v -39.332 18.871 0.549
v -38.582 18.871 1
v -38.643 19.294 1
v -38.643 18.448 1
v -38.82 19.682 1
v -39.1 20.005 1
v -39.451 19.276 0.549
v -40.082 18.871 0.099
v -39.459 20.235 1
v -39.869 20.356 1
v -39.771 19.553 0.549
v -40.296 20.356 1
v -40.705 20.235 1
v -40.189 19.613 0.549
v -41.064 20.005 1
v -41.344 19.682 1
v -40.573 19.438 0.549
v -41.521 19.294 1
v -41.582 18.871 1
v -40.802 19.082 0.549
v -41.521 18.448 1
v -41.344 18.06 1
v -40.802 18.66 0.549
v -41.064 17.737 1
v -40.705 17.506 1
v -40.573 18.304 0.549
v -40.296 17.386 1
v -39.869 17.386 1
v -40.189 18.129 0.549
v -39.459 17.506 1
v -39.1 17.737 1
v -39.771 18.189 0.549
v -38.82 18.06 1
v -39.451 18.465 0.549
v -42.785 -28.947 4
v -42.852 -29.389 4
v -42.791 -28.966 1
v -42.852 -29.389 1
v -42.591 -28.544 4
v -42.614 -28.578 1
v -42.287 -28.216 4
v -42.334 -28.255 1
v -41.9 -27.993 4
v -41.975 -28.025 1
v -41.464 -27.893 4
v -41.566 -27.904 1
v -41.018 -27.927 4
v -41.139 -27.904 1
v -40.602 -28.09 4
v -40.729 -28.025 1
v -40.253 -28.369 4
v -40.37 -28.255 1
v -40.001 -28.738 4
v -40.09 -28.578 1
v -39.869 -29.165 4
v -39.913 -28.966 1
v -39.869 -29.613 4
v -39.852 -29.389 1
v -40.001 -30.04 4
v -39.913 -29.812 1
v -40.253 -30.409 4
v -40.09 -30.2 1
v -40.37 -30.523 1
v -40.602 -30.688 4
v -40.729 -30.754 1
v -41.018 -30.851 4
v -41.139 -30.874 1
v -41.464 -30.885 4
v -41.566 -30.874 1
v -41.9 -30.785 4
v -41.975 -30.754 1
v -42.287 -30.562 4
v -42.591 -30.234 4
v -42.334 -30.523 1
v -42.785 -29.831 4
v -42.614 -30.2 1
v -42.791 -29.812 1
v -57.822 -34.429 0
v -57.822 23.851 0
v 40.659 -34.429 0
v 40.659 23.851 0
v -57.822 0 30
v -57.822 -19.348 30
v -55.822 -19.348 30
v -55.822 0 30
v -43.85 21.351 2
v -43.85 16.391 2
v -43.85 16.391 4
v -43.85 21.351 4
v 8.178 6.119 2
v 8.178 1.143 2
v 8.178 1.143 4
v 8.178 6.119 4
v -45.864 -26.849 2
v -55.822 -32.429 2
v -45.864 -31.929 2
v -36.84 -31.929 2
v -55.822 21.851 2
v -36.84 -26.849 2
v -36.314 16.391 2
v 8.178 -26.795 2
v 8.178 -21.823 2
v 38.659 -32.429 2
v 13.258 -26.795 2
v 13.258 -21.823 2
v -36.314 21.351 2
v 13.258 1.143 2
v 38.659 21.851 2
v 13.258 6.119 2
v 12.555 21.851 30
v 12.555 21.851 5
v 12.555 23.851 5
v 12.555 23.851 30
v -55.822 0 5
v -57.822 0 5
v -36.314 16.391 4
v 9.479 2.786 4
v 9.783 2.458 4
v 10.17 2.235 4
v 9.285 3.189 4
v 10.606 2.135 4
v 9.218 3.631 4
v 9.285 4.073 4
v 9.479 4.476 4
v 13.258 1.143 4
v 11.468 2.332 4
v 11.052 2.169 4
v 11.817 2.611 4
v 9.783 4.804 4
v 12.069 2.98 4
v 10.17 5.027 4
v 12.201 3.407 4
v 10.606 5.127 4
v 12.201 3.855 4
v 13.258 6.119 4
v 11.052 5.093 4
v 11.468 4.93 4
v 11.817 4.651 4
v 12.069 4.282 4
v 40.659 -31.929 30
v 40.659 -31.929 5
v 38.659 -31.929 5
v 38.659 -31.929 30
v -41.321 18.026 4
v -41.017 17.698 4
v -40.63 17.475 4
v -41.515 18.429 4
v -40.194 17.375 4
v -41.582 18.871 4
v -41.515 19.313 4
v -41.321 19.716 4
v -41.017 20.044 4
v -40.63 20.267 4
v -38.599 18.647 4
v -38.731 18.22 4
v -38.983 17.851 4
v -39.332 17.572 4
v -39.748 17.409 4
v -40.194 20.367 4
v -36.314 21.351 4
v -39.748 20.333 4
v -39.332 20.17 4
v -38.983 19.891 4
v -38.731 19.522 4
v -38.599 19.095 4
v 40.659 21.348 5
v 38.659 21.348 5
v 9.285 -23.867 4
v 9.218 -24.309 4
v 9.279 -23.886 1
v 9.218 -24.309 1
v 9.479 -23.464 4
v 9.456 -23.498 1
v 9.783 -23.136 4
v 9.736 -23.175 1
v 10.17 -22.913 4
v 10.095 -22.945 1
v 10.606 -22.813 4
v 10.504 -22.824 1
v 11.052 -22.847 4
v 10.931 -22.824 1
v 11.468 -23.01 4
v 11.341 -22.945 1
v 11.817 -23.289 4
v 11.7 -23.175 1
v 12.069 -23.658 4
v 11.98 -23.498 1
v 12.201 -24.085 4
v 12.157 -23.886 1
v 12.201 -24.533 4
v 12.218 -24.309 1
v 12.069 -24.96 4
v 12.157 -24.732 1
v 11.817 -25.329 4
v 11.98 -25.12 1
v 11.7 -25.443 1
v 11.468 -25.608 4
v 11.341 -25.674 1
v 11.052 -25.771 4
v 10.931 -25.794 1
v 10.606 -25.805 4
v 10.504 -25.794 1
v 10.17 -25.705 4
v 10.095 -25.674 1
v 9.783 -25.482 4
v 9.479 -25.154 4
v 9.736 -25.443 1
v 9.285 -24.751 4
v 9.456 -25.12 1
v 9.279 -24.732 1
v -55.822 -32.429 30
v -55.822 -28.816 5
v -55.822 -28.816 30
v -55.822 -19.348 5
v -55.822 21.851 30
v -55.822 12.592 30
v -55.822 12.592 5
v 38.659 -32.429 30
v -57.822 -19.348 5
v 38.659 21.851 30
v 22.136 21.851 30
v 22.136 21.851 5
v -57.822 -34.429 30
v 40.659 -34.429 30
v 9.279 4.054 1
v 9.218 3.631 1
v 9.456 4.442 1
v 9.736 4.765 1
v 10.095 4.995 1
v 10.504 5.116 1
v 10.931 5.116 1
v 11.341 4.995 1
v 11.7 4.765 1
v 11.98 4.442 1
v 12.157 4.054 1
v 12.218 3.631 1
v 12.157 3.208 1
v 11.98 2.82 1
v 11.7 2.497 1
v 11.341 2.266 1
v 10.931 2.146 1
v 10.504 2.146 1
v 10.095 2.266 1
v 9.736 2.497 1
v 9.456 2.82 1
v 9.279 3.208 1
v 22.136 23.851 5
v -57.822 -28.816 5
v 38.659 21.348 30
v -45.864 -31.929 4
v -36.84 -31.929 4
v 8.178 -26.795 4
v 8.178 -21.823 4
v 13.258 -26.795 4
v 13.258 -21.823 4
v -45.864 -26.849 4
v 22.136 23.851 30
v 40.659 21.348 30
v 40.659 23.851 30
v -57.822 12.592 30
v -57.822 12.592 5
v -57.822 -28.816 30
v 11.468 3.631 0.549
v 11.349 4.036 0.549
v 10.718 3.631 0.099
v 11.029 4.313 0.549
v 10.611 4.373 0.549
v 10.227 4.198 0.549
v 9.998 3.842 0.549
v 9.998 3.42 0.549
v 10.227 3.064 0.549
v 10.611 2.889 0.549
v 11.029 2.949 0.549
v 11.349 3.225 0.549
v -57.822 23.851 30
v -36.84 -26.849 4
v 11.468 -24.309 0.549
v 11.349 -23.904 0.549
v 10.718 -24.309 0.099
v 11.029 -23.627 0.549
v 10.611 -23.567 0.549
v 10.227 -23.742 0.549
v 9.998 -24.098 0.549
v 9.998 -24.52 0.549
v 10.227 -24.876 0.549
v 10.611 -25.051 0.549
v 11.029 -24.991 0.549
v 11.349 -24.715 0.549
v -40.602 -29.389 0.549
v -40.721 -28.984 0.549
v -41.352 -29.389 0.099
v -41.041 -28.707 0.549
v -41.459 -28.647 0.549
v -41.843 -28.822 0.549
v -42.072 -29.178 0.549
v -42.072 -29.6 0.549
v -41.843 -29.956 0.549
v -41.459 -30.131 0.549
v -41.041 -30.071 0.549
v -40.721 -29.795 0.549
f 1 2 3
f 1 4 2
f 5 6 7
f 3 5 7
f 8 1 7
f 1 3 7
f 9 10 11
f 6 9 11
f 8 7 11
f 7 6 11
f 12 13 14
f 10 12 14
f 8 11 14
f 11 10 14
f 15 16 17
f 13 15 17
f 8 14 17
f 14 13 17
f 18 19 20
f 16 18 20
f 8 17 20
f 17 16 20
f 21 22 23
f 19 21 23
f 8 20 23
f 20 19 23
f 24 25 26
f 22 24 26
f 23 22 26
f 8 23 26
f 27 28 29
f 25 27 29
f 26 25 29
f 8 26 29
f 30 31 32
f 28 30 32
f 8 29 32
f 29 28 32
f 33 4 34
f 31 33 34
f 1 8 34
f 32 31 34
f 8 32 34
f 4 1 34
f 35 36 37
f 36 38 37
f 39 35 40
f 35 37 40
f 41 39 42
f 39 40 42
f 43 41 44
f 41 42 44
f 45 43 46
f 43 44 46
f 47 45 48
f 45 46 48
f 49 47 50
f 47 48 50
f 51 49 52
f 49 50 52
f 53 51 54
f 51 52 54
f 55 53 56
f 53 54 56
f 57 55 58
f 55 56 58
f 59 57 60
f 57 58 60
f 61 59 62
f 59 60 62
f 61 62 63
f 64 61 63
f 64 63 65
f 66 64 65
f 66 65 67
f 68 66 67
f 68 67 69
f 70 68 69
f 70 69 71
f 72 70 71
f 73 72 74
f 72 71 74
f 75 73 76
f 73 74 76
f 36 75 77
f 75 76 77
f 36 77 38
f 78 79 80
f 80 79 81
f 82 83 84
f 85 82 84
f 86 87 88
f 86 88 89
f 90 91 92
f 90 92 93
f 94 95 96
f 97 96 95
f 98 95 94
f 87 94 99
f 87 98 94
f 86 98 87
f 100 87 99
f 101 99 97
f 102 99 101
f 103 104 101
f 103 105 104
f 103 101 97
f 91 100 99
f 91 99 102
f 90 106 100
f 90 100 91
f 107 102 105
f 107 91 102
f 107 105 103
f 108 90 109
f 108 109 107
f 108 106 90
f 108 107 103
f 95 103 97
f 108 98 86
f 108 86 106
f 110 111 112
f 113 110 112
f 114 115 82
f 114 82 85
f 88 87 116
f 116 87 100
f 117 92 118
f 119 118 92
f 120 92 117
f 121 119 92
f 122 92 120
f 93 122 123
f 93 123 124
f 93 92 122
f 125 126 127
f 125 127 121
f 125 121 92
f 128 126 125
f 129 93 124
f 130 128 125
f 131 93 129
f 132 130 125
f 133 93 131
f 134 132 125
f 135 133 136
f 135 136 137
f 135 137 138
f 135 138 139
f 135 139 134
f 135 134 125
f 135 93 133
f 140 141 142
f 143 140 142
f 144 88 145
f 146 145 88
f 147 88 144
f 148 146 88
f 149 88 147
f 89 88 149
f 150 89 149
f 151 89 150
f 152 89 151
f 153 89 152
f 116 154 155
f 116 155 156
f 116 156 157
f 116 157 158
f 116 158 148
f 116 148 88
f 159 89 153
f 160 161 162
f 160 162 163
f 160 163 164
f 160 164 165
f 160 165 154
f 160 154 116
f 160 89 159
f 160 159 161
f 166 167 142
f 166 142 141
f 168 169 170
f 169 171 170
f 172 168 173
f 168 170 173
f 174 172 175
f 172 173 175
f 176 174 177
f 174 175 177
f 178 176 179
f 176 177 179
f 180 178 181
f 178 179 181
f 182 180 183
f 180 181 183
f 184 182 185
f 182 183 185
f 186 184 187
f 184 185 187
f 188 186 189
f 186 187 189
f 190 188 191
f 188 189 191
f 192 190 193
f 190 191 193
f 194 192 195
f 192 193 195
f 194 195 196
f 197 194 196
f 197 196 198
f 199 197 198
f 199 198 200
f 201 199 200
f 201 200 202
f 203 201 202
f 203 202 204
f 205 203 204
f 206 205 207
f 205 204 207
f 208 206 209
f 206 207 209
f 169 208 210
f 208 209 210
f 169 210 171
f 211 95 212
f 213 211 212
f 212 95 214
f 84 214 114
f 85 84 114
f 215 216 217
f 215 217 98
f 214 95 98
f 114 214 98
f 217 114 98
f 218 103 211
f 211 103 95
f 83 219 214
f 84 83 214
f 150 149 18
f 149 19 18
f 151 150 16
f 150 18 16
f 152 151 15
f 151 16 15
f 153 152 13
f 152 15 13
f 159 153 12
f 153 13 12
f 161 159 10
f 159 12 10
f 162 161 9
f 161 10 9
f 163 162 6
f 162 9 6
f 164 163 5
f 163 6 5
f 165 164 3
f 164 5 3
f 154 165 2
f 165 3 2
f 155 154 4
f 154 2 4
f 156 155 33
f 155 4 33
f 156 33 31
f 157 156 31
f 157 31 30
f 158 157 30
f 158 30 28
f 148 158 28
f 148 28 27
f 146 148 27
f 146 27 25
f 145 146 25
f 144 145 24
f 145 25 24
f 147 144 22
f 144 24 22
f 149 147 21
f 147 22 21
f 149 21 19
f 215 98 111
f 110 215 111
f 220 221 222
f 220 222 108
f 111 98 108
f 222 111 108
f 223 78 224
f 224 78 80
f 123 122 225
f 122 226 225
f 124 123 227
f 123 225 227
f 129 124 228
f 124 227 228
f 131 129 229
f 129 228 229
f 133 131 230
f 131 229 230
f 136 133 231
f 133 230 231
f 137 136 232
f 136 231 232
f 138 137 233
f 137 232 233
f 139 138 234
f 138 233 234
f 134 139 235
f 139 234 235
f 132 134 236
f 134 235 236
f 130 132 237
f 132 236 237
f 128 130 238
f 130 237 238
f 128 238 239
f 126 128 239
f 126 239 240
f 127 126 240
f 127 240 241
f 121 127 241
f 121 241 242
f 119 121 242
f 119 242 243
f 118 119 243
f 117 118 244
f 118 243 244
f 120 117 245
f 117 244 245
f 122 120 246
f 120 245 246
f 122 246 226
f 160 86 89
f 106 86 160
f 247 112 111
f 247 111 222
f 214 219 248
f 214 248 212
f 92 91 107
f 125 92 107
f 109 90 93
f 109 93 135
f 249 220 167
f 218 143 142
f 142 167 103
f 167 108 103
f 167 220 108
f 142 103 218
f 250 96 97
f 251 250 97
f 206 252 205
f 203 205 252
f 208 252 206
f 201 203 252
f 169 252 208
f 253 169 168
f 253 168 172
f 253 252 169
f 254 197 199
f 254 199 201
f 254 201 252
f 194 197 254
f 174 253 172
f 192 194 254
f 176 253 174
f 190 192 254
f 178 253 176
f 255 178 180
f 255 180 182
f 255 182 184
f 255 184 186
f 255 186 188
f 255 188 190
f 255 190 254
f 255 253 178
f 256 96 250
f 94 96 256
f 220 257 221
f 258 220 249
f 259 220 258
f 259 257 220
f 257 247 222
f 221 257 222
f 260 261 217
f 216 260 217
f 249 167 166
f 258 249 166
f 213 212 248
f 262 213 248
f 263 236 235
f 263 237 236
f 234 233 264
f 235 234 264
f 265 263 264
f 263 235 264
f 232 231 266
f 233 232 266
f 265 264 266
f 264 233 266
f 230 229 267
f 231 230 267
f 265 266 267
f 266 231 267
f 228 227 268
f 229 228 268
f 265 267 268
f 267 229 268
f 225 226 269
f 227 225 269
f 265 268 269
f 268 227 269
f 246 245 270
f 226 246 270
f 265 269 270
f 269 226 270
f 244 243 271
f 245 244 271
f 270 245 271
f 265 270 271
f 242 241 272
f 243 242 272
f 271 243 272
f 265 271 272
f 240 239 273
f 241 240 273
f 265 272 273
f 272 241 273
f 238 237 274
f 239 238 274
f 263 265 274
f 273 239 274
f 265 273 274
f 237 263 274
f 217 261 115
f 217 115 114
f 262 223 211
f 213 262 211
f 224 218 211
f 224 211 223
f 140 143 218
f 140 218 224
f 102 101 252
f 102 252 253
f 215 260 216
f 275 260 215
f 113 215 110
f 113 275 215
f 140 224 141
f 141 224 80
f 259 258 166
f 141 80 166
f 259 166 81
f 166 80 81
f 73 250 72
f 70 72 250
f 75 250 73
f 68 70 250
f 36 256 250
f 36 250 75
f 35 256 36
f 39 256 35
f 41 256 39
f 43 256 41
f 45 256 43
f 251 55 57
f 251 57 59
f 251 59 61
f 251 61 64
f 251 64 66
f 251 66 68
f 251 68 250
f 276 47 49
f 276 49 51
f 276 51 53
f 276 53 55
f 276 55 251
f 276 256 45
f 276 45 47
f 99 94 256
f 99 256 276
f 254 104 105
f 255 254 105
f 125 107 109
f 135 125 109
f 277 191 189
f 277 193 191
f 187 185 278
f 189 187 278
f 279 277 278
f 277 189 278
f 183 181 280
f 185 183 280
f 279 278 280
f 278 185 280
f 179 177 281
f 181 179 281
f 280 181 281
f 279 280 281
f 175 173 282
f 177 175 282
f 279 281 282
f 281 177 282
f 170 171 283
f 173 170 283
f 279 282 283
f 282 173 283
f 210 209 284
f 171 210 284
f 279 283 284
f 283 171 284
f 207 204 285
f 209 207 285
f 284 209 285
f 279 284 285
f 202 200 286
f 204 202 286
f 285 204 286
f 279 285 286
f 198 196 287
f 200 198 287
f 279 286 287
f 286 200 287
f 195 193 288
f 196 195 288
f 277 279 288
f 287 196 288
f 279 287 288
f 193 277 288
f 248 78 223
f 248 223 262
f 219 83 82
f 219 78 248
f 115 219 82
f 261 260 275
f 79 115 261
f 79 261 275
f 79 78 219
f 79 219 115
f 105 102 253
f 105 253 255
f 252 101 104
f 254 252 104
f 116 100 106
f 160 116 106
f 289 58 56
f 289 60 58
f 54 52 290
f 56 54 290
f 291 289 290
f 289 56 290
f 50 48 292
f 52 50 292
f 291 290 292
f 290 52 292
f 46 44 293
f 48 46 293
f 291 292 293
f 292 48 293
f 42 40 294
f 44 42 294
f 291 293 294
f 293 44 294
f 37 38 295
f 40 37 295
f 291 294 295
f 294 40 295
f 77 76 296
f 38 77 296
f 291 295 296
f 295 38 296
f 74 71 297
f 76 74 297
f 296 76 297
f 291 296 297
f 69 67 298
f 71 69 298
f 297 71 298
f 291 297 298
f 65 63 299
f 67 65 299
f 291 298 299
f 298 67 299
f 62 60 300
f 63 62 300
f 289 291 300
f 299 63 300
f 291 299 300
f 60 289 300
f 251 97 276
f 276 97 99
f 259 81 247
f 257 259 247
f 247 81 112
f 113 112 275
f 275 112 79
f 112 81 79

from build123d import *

# Parameters (mm, degrees)
F0_W     = 9.0247368789
F0_H     = 5.08
F0_W_2   = 5.08
F0_H_2   = 4.9726772237
F0_W_3   = 7.5355667663
F0_H_3   = 4.96
F0_H_4   = 4.9763912218
F1_DEPTH = 2
F2_DEPTH = 4
F4_D     = 3
F4_DEPTH = 3
F4_TIP   = 0.9012909285
F0_W_4   = 2
F0_H_5   = 19.347961992
F5_DEPTH = 30
F0_H_6   = 9.4683412462
F0_H_7   = 12.5924479216
F0_W_5   = 9.5816506073
F0_H_8   = 2
F0_H_9   = 53.2766682494
F6_DEPTH = 5


with BuildPart() as f1:
    # F0 (on Top) → F1 (new body)
    with BuildSketch(Plane.XY):
        Polygon((12.5546930358, 21.8509457558), (-55.8220994771, 21.8509457558), (-55.8220994771, 12.5924479216), (-55.8220994771, 0), (-55.8220994771, -19.347961992), (-55.8220994771, -28.8163032383), (-55.8220994771, -32.4290542442), (38.6587072041, -32.4290542442), (38.6587072041, -31.9290542442), (38.6587072041, 21.3476140052), (38.6587072041, 21.8509457558), (22.1363436431, 21.8509457558), align=None)
        with Locations((-41.3520994771, -29.3890542442)):
            Rectangle(F0_W, F0_H, mode=Mode.SUBTRACT)
        with Locations((10.7179005229, -24.3090542442)):
            Rectangle(F0_W_2, F0_H_2, mode=Mode.SUBTRACT)
        with Locations((-40.0820994771, 18.8709457558)):
            Rectangle(F0_W_3, F0_H_3, mode=Mode.SUBTRACT)
        with Locations((10.7179005229, 3.6309457558)):
            Rectangle(F0_W_2, F0_H_4, mode=Mode.SUBTRACT)
    extrude(amount=F1_DEPTH)

    # F0 (on Top) → F2 (join)
    with BuildSketch(Plane.XY):
        with Locations((-40.0820994771, 18.8709457558)):
            Rectangle(F0_W_3, F0_H_3)
        with Locations((10.7179005229, 3.6309457558)):
            Rectangle(F0_W_2, F0_H_4)
        with Locations((10.7179005229, -24.3090542442)):
            Rectangle(F0_W_2, F0_H_2)
        with Locations((-41.3520994771, -29.3890542442)):
            Rectangle(F0_W, F0_H)
    extrude(amount=F2_DEPTH)

    # F4
    with Locations(Plane.XY.offset(4)):
        with Locations((-40.0820994771, 18.8709457558), (-41.3520994771, -29.3890542442), (10.7179005229, -24.3090542442), (10.7179005229, 3.6309457558)):
            Hole(F4_D / 2, depth=F4_DEPTH)
            with Locations((0, 0, -(F4_DEPTH + F4_TIP / 2))):  # 118° drill point
                Cone(0, F4_D / 2, F4_TIP, mode=Mode.SUBTRACT)

    # F0 (on Top) → F5 (join)
    with BuildSketch(Plane.XY):
        Polygon((-55.8220994771, -32.4290542442), (-55.8220994771, -28.8163032383), (-57.8220994771, -28.8163032383), (-57.8220994771, -34.4290542442), (40.6587072041, -34.4290542442), (40.6587072041, -31.9290542442), (38.6587072041, -31.9290542442), (38.6587072041, -32.4290542442), align=None)
        Polygon((-55.8220994771, 12.5924479216), (-55.8220994771, 21.8509457558), (12.5546930358, 21.8509457558), (12.5546930358, 23.8509457558), (-57.8220994771, 23.8509457558), (-57.8220994771, 12.5924479216), align=None)
        with Locations((-56.8220994771, -9.673980996)):
            Rectangle(F0_W_4, F0_H_5)
        Polygon((22.1363436431, 23.8509457558), (22.1363436431, 21.8509457558), (38.6587072041, 21.8509457558), (38.6587072041, 21.3476140052), (40.6587072041, 21.3476140052), (40.6587072041, 23.8509457558), align=None)
    extrude(amount=F5_DEPTH)

    # F0 (on Top) → F6 (join)
    with BuildSketch(Plane.XY):
        with Locations((-56.8220994771, -24.0821326151)):
            Rectangle(F0_W_4, F0_H_6)
        with Locations((-56.8220994771, 6.2962239608)):
            Rectangle(F0_W_4, F0_H_7)
        with Locations((17.3455183394, 22.8509457558)):
            Rectangle(F0_W_5, F0_H_8)
        with Locations((39.6587072041, -5.2907201195)):
            Rectangle(F0_W_4, F0_H_9)
    extrude(amount=F6_DEPTH)


solid = f1.part
